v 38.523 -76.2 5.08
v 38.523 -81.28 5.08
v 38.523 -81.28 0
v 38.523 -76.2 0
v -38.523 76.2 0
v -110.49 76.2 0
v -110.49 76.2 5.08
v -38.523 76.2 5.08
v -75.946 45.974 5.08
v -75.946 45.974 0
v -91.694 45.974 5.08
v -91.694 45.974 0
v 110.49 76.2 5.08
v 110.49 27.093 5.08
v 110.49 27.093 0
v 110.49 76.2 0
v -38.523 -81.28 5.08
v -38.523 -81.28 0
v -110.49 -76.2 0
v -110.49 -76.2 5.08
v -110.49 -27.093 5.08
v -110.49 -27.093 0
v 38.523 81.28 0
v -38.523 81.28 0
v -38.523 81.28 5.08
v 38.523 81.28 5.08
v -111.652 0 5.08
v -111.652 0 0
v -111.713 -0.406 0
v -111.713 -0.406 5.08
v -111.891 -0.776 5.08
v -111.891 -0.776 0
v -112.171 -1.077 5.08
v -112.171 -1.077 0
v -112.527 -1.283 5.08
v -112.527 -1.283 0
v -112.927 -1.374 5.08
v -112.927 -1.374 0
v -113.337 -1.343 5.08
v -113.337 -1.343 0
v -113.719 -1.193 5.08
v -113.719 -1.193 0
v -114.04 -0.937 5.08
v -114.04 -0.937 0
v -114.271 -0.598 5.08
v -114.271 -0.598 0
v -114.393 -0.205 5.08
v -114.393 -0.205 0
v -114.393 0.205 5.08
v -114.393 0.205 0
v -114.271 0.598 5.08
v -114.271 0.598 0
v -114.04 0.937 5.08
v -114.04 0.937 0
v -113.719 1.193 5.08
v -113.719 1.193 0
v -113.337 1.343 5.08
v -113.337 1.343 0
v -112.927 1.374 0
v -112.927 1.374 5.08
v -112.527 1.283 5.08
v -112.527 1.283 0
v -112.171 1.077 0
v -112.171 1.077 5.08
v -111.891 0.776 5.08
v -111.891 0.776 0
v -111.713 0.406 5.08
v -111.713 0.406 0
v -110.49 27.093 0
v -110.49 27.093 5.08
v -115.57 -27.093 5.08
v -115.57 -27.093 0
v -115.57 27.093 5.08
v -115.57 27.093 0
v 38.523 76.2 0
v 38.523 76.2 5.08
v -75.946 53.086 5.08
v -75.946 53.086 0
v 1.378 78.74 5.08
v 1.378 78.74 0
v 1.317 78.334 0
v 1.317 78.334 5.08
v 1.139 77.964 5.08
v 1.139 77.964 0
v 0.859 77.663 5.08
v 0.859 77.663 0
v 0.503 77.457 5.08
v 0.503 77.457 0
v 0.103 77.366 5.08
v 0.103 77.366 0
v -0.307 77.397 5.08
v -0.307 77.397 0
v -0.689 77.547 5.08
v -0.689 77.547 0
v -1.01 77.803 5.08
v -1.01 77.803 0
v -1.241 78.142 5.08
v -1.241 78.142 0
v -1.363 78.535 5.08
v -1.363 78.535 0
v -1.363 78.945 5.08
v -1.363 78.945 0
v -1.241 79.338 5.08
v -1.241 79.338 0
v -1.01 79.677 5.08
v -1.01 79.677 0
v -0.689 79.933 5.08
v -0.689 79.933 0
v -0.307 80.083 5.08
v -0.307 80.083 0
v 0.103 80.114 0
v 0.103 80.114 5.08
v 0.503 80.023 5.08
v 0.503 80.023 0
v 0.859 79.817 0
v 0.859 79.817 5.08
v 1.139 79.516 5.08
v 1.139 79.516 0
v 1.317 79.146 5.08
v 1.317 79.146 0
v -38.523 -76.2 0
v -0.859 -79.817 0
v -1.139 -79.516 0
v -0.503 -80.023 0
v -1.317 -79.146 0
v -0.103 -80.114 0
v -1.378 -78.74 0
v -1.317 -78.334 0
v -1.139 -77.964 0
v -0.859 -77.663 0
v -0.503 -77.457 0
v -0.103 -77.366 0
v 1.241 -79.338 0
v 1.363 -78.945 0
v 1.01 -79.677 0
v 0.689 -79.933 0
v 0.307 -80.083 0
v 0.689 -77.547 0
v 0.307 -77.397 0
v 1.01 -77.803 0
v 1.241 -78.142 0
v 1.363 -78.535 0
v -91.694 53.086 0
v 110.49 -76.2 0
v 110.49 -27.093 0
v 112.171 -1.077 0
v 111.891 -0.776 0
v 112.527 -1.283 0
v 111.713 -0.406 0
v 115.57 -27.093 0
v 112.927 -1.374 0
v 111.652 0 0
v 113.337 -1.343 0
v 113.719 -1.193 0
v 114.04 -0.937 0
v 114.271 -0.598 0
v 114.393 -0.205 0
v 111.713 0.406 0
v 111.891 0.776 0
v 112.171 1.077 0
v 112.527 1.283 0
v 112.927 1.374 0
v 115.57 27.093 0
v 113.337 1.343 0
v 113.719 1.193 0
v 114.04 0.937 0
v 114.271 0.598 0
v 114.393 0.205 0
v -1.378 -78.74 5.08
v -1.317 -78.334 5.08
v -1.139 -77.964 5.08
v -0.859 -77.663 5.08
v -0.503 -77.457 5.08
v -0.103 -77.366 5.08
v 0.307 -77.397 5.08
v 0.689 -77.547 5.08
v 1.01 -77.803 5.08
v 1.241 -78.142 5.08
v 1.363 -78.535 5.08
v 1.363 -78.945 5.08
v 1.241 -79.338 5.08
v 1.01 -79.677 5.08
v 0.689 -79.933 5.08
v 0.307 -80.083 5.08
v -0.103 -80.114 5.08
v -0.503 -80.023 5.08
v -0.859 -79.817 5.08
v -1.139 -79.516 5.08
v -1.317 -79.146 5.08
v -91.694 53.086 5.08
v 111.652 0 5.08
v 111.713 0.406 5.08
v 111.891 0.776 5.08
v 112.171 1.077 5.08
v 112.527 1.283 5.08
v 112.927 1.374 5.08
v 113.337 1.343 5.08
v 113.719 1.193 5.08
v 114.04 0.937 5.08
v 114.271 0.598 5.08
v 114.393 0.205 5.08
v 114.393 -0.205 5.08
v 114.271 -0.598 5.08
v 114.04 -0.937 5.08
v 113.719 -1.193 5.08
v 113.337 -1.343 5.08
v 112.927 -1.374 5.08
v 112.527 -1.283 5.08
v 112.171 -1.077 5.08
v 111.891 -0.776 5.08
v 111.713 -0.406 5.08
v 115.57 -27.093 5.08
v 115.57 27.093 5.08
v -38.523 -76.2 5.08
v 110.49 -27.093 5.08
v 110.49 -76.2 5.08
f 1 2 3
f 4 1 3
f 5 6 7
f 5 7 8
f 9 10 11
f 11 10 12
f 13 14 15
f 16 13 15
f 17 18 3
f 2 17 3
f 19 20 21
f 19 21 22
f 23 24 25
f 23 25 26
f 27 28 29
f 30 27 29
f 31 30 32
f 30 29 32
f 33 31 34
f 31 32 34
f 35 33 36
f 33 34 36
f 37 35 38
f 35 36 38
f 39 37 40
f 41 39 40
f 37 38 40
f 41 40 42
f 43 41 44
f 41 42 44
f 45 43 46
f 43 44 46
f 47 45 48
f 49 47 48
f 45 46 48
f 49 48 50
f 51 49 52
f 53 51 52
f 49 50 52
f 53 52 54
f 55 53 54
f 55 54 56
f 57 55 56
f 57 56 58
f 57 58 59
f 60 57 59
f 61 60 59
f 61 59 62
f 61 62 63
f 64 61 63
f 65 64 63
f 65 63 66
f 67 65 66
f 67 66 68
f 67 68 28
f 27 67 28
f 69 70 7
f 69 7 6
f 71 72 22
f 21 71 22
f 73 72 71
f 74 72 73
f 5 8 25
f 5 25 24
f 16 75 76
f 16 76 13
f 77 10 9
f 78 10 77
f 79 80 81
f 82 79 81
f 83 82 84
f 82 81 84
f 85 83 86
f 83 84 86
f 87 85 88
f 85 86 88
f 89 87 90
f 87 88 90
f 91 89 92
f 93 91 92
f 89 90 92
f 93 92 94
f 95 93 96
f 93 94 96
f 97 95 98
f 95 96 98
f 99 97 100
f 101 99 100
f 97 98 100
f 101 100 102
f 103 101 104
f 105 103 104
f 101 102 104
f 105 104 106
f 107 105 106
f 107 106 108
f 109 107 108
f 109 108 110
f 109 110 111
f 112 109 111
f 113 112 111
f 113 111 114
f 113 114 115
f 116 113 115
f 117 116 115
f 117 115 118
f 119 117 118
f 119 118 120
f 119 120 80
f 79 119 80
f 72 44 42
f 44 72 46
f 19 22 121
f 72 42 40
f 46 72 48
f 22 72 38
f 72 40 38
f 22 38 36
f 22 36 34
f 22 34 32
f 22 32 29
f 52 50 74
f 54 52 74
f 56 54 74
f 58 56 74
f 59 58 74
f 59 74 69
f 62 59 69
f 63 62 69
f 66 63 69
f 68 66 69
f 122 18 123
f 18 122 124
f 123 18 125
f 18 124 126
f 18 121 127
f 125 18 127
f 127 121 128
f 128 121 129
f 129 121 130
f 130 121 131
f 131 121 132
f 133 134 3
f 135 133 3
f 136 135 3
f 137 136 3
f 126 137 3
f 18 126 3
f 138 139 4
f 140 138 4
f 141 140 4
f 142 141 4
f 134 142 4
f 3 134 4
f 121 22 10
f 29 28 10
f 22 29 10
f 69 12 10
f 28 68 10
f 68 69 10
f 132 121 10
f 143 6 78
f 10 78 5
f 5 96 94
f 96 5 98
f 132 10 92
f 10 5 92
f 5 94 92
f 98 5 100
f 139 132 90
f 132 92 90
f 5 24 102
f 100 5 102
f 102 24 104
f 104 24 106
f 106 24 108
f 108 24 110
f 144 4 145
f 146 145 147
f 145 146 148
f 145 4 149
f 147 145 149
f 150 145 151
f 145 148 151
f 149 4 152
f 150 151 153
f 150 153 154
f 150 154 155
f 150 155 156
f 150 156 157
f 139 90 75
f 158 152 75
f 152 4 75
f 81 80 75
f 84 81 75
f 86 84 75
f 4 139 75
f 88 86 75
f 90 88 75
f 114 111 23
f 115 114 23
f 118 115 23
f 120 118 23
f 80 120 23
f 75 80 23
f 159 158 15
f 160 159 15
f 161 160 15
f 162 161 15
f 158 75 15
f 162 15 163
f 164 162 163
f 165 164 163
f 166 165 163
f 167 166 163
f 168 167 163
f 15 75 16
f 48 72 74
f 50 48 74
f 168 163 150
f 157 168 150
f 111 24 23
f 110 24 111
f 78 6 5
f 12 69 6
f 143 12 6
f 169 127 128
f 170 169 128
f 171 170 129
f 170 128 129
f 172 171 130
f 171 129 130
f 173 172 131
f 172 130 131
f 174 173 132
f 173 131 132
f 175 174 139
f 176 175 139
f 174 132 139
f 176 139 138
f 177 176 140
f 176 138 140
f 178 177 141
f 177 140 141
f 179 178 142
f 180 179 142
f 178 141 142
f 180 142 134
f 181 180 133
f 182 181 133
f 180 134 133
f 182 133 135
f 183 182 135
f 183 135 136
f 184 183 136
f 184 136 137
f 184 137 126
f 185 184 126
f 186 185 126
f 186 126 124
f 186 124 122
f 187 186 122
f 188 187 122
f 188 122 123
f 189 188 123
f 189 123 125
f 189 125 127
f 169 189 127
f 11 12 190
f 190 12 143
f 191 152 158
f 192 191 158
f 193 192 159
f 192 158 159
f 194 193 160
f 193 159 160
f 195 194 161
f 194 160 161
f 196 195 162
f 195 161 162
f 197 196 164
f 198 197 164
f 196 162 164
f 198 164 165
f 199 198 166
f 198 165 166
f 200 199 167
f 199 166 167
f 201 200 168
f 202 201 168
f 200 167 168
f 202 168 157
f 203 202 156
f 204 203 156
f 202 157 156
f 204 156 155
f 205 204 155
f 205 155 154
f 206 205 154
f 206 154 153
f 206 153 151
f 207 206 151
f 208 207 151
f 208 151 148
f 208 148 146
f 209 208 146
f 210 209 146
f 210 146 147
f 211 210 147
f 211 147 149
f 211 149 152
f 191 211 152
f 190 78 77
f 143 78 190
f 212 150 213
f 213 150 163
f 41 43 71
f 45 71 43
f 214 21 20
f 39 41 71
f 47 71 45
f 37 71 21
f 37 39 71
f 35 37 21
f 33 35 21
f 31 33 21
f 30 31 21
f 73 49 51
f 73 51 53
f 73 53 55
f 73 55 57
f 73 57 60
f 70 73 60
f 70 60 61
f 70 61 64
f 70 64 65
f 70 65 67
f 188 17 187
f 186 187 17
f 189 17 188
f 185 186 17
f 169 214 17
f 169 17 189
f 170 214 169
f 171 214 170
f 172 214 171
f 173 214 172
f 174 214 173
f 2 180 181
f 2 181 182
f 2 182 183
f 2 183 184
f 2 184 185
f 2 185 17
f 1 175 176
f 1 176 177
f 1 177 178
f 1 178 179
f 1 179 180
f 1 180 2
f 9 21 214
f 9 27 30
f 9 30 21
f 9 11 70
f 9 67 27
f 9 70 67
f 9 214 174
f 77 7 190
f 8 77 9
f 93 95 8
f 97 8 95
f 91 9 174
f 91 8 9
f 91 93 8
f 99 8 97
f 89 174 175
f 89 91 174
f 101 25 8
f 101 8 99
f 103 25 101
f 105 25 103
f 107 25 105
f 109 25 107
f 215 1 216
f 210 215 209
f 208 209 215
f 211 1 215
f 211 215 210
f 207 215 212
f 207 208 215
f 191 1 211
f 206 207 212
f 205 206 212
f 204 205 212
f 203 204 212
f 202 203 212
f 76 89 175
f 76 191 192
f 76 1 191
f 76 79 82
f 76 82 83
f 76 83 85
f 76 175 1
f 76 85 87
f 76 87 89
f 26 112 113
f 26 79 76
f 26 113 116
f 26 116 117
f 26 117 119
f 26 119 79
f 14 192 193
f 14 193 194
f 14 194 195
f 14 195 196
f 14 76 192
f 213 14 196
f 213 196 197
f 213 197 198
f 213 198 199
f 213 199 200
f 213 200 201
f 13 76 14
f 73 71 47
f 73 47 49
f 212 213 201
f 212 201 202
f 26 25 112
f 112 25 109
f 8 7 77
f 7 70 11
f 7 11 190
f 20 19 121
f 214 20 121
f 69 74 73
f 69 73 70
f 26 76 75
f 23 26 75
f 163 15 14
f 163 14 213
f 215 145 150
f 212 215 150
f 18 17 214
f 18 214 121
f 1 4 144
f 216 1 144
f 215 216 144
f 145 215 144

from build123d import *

# Parameters (mm, degrees)
SKETCH1_W           = 231.14
SKETCH1_H           = 162.56
BOSS_EXTRUDE1_DEPTH = 5.08
SKETCH2_R           = 1.37795
CUT_EXTRUDE1_DEPTH  = 142.381291902
CAVITY2_START       = -81.28
CAVITY2_OUTLINE_W   = 77.046666667
CAVITY2_OUTLINE_H   = 5.08
CAVITY2_DEPTH       = 5.08
CAVITY2_START_2     = 76.2
CAVITY2_2_OUTLINE_W = 77.046666667
CAVITY2_2_OUTLINE_H = 5.08
CAVITY2_2_DEPTH     = 5.08
CAVITY2_START_3     = -76.2
CAVITY2_3_OUTLINE_W = 5.08
CAVITY2_3_OUTLINE_H = 5.08
CAVITY2_3_DEPTH     = 49.106666667
CAVITY2_START_4     = 27.093333333
CAVITY2_4_OUTLINE_W = 5.08
CAVITY2_4_OUTLINE_H = 5.08
CAVITY2_4_DEPTH     = 49.106666667
SKETCH3_W           = 15.748
SKETCH3_H           = 7.112
CUT_EXTRUDE2_DEPTH  = 142.381291902


# Read off the part's stored shape, not the designer's step: Cavity2
with BuildPart() as part:
    # Sketch1 → Boss-Extrude1 (new body)
    with BuildSketch(Plane.XY):
        Rectangle(SKETCH1_W, SKETCH1_H)
    extrude(amount=BOSS_EXTRUDE1_DEPTH)

    # Sketch2 → Cut-Extrude1 (cut, through all)
    with BuildSketch(Plane(origin=(0, 0, 0), x_dir=(-1, 0, 0), z_dir=(0, 0, -1))):
        with Locations((-113.03, 0)):
            Circle(SKETCH2_R)
        with Locations(Location((0, 78.74, 0), (0, 0, 180))):
            Circle(SKETCH2_R)
        with Locations(Location((113.03, 0, 0), (0, 0, 180))):
            Circle(SKETCH2_R)
        with Locations((0, -78.74)):
            Circle(SKETCH2_R)
    extrude(amount=-CUT_EXTRUDE1_DEPTH, mode=Mode.SUBTRACT)

    # Cavity2 outline → Cavity2 (cut)
    with BuildSketch(Plane(origin=(0, 0, 0), x_dir=(1, 0, 0), z_dir=(0, 1, 0)).offset(CAVITY2_START)):
        with Locations((-77.046666667, -2.54)):
            Rectangle(CAVITY2_OUTLINE_W, CAVITY2_OUTLINE_H)
        with Locations((77.046666667, -2.54)):
            Rectangle(CAVITY2_OUTLINE_W, CAVITY2_OUTLINE_H)
    extrude(amount=CAVITY2_DEPTH, mode=Mode.SUBTRACT)

    # Cavity2 2 outline → Cavity2 2 (cut)
    with BuildSketch(Plane(origin=(0, 0, 0), x_dir=(1, 0, 0), z_dir=(0, 1, 0)).offset(CAVITY2_START_2)):
        with Locations((-77.046666667, -2.54)):
            Rectangle(CAVITY2_2_OUTLINE_W, CAVITY2_2_OUTLINE_H)
        with Locations((77.046666667, -2.54)):
            Rectangle(CAVITY2_2_OUTLINE_W, CAVITY2_2_OUTLINE_H)
    extrude(amount=CAVITY2_2_DEPTH, mode=Mode.SUBTRACT)

    # Cavity2 3 outline → Cavity2 3 (cut)
    with BuildSketch(Plane(origin=(0, 0, 0), x_dir=(1, 0, 0), z_dir=(0, 1, 0)).offset(CAVITY2_START_3)):
        with Locations((-113.03, -2.54)):
            Rectangle(CAVITY2_3_OUTLINE_W, CAVITY2_3_OUTLINE_H)
        with Locations((113.03, -2.54)):
            Rectangle(CAVITY2_3_OUTLINE_W, CAVITY2_3_OUTLINE_H)
    extrude(amount=CAVITY2_3_DEPTH, mode=Mode.SUBTRACT)

    # Cavity2 4 outline → Cavity2 4 (cut)
    with BuildSketch(Plane(origin=(0, 0, 0), x_dir=(1, 0, 0), z_dir=(0, 1, 0)).offset(CAVITY2_START_4)):
        with Locations((-113.03, -2.54)):
            Rectangle(CAVITY2_4_OUTLINE_W, CAVITY2_4_OUTLINE_H)
        with Locations((113.03, -2.54)):
            Rectangle(CAVITY2_4_OUTLINE_W, CAVITY2_4_OUTLINE_H)
    extrude(amount=CAVITY2_4_DEPTH, mode=Mode.SUBTRACT)

    # Sketch3 → Cut-Extrude2 (cut, through all)
    with BuildSketch(Plane(origin=(0, 0, 0), x_dir=(-1, 0, 0), z_dir=(0, 0, -1))):
        with Locations((83.82, 49.53)):
            Rectangle(SKETCH3_W, SKETCH3_H)
    extrude(amount=-CUT_EXTRUDE2_DEPTH, mode=Mode.SUBTRACT)


solid = part.part
